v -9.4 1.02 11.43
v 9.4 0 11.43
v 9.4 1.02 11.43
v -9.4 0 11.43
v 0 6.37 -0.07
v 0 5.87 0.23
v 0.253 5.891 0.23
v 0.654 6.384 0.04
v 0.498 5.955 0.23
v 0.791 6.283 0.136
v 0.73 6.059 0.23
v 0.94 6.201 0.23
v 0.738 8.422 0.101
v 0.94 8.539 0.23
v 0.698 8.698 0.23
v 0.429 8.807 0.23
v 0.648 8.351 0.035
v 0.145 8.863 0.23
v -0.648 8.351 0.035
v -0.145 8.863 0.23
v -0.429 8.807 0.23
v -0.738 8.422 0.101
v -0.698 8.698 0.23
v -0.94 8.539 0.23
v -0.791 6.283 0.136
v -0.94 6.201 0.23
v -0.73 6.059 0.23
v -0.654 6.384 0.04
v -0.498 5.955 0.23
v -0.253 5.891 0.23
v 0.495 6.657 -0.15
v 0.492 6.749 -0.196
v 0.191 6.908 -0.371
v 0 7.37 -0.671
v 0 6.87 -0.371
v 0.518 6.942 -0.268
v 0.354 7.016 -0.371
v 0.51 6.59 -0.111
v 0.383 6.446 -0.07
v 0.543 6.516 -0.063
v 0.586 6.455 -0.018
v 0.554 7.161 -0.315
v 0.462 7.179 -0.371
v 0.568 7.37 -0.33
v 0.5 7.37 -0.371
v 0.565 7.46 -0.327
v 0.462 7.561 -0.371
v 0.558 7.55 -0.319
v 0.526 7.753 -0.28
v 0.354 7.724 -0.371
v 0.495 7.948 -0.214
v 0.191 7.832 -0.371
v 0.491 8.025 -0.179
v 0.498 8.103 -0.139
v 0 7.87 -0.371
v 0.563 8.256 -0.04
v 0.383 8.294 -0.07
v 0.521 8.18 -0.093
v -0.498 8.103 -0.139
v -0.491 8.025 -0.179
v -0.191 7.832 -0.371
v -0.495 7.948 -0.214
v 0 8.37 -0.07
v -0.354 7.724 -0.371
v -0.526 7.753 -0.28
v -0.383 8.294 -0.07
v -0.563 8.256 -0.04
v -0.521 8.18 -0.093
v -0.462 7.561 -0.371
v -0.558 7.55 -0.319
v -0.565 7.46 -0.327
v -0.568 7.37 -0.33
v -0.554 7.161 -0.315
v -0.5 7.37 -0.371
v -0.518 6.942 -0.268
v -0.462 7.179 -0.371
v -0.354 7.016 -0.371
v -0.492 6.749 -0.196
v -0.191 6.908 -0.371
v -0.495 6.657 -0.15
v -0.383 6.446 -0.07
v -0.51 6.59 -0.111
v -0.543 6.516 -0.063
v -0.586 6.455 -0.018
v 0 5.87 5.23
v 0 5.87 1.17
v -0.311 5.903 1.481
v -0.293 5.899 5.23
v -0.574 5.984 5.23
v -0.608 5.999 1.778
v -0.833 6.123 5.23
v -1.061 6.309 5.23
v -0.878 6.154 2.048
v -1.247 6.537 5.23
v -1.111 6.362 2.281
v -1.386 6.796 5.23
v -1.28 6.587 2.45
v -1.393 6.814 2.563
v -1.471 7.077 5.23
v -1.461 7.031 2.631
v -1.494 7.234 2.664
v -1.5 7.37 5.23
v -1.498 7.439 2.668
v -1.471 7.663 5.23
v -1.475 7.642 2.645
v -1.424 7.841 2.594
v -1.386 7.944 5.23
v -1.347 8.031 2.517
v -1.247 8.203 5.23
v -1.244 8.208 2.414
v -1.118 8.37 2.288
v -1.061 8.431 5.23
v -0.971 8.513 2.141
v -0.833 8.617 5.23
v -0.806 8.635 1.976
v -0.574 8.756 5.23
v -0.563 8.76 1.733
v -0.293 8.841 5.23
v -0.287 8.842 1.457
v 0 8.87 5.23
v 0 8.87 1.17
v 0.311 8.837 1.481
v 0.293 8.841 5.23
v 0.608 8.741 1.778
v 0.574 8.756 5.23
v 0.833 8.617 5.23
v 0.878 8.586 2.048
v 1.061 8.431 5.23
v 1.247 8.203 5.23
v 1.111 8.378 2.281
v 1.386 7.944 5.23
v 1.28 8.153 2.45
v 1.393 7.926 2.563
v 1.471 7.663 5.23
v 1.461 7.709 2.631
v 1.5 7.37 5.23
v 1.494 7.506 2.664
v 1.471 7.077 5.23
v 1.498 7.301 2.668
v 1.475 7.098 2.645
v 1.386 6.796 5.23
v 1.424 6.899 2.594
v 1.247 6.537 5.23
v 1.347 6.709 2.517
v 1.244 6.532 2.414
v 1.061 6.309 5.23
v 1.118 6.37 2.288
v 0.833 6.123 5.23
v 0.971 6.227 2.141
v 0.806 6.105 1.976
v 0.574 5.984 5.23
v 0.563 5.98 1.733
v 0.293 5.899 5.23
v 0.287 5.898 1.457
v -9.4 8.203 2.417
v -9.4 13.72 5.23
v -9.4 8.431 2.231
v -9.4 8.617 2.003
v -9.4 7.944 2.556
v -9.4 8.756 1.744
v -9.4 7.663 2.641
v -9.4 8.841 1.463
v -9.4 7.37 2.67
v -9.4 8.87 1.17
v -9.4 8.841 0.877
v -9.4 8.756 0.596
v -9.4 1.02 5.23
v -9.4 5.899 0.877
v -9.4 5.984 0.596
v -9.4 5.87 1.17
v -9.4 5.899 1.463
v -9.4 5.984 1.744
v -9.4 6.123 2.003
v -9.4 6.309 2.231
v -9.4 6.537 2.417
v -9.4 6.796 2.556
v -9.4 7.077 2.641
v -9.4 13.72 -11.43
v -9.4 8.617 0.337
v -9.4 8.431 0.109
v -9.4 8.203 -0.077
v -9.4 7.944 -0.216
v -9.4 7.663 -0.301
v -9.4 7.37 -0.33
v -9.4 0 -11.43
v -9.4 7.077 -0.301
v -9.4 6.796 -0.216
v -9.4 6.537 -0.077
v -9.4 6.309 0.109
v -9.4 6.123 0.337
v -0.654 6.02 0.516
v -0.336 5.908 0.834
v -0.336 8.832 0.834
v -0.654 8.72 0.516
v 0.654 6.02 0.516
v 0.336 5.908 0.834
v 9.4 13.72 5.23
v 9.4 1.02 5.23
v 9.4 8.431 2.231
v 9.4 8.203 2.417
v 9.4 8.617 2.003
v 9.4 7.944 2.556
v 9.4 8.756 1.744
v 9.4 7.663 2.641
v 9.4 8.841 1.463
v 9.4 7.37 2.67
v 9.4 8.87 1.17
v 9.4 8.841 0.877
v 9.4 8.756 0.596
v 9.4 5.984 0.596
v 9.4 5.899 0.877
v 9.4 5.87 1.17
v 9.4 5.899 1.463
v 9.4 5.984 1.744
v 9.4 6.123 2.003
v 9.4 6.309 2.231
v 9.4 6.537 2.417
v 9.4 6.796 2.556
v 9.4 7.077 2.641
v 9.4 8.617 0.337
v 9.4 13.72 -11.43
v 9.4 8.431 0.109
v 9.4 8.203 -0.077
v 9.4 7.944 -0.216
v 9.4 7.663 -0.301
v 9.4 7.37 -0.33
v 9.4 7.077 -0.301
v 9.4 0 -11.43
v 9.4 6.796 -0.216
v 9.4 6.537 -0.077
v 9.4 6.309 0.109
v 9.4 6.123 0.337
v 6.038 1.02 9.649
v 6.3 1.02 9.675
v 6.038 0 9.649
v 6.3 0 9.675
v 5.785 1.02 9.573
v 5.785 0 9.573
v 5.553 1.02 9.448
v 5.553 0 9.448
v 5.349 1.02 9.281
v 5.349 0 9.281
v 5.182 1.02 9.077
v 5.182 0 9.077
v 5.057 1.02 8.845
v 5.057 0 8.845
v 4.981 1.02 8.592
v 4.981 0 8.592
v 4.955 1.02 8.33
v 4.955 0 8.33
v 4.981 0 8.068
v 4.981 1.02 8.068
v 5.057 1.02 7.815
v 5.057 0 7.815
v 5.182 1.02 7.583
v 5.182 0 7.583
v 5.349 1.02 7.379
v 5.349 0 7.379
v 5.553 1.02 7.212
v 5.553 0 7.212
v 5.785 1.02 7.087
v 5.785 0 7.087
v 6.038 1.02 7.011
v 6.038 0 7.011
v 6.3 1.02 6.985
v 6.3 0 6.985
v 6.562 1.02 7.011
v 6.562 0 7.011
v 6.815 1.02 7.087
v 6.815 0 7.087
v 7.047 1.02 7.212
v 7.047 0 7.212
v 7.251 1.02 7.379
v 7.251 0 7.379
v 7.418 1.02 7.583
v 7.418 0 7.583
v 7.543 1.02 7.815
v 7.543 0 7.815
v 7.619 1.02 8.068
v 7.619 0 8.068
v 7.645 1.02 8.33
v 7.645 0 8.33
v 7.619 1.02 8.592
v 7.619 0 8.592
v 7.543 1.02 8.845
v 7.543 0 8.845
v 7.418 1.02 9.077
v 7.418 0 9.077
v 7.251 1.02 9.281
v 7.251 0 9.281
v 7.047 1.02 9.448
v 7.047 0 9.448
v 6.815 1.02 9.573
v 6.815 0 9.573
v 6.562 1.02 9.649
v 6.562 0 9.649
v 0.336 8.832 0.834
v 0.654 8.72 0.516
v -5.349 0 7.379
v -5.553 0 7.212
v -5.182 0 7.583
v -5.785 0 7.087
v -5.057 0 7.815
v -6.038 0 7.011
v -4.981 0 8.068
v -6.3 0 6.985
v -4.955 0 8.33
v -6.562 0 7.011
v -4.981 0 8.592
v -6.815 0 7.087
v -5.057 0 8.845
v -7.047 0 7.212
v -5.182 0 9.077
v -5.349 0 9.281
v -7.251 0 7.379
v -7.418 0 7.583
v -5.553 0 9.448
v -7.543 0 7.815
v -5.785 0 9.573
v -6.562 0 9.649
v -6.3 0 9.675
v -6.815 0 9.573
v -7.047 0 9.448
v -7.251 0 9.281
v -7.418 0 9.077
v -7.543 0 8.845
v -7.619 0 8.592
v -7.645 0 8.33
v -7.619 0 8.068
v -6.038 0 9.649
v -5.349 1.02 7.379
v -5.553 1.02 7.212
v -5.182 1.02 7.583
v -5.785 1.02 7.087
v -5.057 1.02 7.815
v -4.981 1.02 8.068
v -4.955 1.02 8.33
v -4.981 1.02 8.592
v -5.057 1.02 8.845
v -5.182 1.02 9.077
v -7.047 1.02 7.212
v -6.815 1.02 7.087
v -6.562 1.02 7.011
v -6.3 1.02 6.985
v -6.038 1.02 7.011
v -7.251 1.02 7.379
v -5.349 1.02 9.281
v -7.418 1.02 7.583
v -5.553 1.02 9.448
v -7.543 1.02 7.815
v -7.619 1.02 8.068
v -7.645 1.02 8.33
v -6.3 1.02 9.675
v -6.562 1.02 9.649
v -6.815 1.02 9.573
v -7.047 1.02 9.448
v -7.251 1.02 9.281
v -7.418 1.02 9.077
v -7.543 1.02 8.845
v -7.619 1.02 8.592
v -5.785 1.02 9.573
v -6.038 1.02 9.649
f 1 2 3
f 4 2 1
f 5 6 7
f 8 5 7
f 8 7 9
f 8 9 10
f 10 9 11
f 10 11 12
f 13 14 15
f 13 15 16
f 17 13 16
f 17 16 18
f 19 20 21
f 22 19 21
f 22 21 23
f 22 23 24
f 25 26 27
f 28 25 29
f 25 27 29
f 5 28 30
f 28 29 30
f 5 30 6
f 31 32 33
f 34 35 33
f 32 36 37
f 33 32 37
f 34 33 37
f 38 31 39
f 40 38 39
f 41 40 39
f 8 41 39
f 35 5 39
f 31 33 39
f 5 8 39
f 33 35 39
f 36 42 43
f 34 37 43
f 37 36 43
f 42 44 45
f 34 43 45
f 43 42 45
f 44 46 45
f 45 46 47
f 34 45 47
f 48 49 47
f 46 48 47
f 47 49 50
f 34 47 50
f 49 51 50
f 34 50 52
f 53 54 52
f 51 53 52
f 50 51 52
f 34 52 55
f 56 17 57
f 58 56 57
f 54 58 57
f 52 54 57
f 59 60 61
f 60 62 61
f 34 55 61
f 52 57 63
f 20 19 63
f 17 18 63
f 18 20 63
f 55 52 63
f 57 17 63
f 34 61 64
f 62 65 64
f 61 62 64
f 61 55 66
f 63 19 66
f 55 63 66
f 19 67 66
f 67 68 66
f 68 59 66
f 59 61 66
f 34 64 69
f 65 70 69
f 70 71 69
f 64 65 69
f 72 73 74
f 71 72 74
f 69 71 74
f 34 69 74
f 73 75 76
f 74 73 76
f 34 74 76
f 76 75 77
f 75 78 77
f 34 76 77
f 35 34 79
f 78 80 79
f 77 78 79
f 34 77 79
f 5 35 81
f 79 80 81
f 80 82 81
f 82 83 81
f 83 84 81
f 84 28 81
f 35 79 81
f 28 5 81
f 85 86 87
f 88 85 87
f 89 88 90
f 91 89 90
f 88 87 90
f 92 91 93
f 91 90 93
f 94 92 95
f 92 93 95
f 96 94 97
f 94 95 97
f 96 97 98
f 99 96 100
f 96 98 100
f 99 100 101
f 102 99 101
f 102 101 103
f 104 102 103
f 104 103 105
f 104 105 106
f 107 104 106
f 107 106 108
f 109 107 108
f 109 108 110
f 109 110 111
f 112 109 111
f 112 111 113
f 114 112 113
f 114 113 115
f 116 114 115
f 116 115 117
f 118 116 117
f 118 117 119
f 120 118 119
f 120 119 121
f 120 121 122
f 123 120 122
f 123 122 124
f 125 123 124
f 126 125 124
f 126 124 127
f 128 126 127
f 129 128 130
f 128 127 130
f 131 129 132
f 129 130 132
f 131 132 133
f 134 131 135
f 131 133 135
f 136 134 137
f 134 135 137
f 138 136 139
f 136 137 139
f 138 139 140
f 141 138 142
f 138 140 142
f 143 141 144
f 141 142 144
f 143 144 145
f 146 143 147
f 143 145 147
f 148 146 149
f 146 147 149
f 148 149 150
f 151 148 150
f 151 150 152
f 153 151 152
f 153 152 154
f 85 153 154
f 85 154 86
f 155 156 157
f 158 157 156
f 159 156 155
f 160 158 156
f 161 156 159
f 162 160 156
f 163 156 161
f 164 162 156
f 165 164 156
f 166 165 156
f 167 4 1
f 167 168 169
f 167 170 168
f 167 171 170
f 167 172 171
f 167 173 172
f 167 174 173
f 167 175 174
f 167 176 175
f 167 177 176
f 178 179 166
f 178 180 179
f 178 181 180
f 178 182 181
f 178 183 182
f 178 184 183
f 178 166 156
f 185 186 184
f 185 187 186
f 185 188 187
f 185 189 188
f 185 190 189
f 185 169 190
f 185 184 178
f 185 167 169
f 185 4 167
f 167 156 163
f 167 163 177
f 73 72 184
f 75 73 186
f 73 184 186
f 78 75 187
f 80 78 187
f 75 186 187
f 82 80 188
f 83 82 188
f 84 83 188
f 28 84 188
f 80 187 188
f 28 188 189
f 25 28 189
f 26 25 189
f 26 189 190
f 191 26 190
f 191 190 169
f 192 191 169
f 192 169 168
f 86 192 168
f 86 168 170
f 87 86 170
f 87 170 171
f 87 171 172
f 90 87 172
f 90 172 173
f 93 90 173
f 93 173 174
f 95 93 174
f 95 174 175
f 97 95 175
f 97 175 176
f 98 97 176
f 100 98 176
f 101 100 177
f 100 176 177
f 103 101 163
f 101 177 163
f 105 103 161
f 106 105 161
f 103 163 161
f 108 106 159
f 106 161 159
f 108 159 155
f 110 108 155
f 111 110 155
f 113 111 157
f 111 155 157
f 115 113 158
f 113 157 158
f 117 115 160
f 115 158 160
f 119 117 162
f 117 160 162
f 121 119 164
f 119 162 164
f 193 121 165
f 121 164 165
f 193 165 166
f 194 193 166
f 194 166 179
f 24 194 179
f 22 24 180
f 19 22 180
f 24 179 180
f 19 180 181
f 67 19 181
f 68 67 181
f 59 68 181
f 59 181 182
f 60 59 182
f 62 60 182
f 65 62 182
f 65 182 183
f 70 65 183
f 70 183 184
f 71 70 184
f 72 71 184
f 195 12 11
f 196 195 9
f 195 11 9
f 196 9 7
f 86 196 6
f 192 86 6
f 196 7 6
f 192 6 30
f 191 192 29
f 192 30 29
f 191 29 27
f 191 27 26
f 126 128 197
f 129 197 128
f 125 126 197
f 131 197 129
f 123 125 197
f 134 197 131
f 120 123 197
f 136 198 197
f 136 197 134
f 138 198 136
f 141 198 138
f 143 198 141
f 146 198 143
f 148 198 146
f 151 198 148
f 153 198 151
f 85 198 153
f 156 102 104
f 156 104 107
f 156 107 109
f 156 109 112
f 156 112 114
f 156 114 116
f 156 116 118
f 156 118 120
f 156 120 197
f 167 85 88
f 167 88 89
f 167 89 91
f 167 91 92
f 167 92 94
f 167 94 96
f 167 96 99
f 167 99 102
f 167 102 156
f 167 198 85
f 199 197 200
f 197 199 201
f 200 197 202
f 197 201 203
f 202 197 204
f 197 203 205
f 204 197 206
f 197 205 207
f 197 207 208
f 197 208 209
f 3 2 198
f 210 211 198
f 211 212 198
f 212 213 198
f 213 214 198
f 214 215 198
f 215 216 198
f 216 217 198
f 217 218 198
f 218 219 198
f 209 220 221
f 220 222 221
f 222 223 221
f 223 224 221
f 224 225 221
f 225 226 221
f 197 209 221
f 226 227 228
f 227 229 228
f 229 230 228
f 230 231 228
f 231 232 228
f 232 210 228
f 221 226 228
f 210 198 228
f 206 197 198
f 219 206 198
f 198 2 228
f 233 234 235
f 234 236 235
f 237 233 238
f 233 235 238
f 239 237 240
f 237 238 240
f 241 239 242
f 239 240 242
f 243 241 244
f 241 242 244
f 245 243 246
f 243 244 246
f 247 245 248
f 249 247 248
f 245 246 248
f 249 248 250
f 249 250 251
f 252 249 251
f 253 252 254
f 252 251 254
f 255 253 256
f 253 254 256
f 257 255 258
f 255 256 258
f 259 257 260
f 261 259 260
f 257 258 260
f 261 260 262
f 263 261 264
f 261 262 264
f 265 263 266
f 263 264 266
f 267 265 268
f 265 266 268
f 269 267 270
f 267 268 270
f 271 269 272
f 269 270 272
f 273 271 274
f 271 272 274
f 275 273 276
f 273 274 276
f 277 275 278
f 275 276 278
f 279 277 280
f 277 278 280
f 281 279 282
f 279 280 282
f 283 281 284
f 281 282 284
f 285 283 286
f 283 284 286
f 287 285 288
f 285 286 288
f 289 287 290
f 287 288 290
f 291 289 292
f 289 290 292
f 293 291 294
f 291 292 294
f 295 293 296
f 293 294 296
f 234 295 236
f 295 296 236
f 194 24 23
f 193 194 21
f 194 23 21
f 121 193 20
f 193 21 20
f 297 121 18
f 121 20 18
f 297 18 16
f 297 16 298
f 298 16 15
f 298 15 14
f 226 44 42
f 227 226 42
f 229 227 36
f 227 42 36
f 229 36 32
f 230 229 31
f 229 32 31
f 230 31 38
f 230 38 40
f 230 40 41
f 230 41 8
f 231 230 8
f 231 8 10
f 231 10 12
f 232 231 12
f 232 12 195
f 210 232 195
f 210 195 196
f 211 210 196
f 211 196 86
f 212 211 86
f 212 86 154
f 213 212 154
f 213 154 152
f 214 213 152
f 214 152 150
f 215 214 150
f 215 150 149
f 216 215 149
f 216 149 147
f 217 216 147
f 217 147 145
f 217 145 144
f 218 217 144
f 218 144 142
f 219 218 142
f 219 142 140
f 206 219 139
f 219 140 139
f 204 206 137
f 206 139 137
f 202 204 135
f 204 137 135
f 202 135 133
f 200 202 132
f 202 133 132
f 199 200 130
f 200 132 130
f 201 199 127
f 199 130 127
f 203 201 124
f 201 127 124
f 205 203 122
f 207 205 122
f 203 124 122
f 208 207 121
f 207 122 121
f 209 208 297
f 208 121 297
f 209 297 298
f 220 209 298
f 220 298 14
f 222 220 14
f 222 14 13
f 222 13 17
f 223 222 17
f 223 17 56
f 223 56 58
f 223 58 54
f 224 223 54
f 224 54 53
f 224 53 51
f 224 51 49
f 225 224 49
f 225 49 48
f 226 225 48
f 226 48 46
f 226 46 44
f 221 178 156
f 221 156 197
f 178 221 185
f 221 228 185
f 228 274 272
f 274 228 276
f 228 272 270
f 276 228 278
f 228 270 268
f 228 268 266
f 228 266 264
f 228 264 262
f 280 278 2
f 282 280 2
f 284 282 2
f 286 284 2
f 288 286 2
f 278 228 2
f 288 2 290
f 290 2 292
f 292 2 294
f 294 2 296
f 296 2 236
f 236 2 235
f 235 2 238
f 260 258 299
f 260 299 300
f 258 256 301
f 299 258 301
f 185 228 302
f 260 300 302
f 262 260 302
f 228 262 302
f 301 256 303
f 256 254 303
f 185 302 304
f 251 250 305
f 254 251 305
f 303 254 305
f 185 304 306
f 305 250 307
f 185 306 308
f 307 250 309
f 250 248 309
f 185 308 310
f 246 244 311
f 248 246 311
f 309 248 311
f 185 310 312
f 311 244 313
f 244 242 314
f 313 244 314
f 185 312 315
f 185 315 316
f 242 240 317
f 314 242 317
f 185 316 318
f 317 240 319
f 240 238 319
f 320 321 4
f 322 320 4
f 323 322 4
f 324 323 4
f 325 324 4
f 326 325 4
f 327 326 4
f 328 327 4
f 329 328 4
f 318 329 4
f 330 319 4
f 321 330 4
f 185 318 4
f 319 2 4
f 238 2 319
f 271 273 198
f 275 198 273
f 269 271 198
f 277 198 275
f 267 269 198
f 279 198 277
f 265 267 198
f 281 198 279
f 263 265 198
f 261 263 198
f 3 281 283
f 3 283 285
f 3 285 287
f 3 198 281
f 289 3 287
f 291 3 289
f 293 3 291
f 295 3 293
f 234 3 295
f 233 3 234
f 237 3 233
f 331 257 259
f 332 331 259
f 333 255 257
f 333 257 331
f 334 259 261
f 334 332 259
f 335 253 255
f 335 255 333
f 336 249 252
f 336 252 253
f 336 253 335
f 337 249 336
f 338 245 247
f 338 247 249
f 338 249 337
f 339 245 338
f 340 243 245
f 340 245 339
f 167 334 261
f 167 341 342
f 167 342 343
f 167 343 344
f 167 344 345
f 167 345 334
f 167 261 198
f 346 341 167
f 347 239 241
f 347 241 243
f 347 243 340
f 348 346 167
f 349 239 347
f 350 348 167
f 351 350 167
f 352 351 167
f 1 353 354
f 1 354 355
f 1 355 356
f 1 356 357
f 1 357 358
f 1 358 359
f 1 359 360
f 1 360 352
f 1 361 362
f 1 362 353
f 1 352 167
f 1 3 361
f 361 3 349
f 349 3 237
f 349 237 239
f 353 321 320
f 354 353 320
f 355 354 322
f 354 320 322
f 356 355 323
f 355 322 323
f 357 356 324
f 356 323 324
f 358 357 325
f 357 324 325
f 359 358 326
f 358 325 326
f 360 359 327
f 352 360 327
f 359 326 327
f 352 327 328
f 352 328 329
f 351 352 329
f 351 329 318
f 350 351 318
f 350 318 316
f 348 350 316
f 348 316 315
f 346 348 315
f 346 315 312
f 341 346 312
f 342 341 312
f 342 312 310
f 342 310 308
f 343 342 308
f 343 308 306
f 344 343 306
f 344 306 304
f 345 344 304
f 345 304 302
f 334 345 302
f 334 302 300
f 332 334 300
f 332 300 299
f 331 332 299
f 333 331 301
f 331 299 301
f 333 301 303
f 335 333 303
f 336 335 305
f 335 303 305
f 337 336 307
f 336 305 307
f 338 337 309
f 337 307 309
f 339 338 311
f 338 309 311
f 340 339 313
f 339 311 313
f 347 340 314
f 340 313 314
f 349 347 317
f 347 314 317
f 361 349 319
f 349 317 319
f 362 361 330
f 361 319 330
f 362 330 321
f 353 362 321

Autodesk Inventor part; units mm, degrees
ref_plane "YZ Plane" through (0, 0, 0) normal (1, 0, 0) x (0, 1, 0)
ref_plane "XZ Plane" through (0, 0, 0) normal (0, 1, 0) x (-1, 0, 0)
ref_plane "XY Plane" through (0, 0, 0) normal (0, 0, 1) x (1, 0, 0)
sketch "mounting sheet" plane through (0, 0, 0) normal (0, 1, 0) x (-1, 0, 0)
  line L0 (9.4, -11.43) -> (-9.4, -11.43)
  line L1 (-9.4, -11.43) -> (-9.4, 11.43)
  line L2 (-9.4, 11.43) -> (9.4, 11.43)
  line L3 (9.4, 11.43) -> (9.4, -11.43)
  line L4 (9.4, -11.43) -> (-9.4, 11.43) construction
  line L5 (-9.4, -11.43) -> (9.4, 11.43) construction
  point P0 (0, 0)
  dimension "d0" = 18.8
  dimension "d1" = 22.86
extrude "mounting" add sketch "mounting sheet" along normal blind 1.02
sketch "Sketch2" plane through (0, 1.02, 0) normal (0, 1, 0) x (1, 0, 0)
  line L0 (-9.4, 11.43) -> (-9.4, -11.43) construction
  line L1 (-9.4, -8.33) -> (9.4, -8.33) construction
  line L2 (9.4, -11.43) -> (9.4, 11.43) construction
  line L3 (-9.4, -11.43) -> (9.4, -11.43) construction
  point P0 (0, 0)
  point P1 (-6.3, -8.33)
  point P2 (6.3, -8.33)
  dimension "d10" = 3.1
  dimension "d11" = 3.1
  dimension "d12" = 12.6
hole "Hole1" at (-6.3, 1.02, 8.33) at (6.3, 1.02, 8.33) direction (0, -1, 0) diameter 2.69 end through all
sketch "Sketch4" plane through (0, 1.02, 0) normal (0, 1, 0) x (1, 0, 0)
  line L0 (9.4, 11.43) -> (-9.4, 11.43) projected
  line L1 (9.4, -11.43) -> (9.4, 11.43) projected
  line L2 (-9.4, 11.43) -> (9.4, 11.43)
  line L3 (9.4, 11.43) -> (9.4, -5.23)
  line L4 (9.4, -5.23) -> (-9.4, -5.23)
  line L5 (-9.4, -5.23) -> (-9.4, 11.43)
  line L6 (-9.4, -11.43) -> (9.4, -11.43) projected
  point P0 (0, 0)
  dimension "d21" = 6.2
extrude "Extrusion2" add sketch "Sketch4" along normal blind 12.7
sketch "Sketch5" plane through (-9.4, 1.02, 5.23) normal (0, 0, 1) x (1, 0, 0)
  line L0 (18.8, 12.7) -> (0, 12.7) construction
  line L1 (9.4, 12.7) -> (9.4, 0) construction
  line L2 (0, 0) -> (18.8, 0) construction
  line L3 (18.8, -1.02) -> (18.8, 12.7) construction
  line L4 (0, -1.02) -> (0, 12.7) construction
  line L5 (18.8, 6.35) -> (0, 6.35) construction
  point P0 (9.4, -1.02)
  point P1 (9.4, 6.35)
  dimension "d25" = 7.37
hole "Hole2" at (0, 7.37, 5.23) direction (0, 0, -1) diameter 3 depth 5 tip angle 118
sketch "Sketch6" plane through (9.4, 0, 11.43) normal (1, 0, 0) x (0, 0, -1)
  line L0 (6.2, 1.02) -> (6.2, 13.72) construction
  line L1 (6.2, 7.37) -> (22.8459, 7.37) construction
  line L2 (6.2, 13.72) -> (22.86, 13.72) construction
  line L3 (0, 0) -> (22.86, 0) construction
  line L4 (10.26, 13.72) -> (10.26, 0) construction
  point P0 (11.43, 0)
  point P1 (10.26, 7.37)
  dimension "d33" = 4.06
  dimension "d34" = 7.37
hole "Hole3" at (9.4, 7.37, 1.17) direction (-1, 0, 0) diameter 3 end through all
sketch "Sketch7" plane through (0, 13.72, 0) normal (0, 1, 0) x (1, 0, 0)
  line L0 (-9.4, 11.43) -> (9.4, 11.43) construction
  line L1 (9.4, 11.43) -> (9.4, -5.23) construction
  line L2 (9.4, -5.23) -> (-9.4, -5.23) construction
  line L3 (-9.4, -5.23) -> (-9.4, 11.43) construction
  line L4 (-9.4, 11.43) -> (-9.4, -5.23) projected
  line L5 (9.4, -5.23) -> (9.4, 11.43) projected
  line L6 (9.4, 11.43) -> (-9.4, 11.43) projected
  line L7 (-9.4, -5.23) -> (9.4, -5.23) projected
  point P0 (0, 0)
  point P1 (0, -5.23)
properties part number "ZX10-2-12-S+"
